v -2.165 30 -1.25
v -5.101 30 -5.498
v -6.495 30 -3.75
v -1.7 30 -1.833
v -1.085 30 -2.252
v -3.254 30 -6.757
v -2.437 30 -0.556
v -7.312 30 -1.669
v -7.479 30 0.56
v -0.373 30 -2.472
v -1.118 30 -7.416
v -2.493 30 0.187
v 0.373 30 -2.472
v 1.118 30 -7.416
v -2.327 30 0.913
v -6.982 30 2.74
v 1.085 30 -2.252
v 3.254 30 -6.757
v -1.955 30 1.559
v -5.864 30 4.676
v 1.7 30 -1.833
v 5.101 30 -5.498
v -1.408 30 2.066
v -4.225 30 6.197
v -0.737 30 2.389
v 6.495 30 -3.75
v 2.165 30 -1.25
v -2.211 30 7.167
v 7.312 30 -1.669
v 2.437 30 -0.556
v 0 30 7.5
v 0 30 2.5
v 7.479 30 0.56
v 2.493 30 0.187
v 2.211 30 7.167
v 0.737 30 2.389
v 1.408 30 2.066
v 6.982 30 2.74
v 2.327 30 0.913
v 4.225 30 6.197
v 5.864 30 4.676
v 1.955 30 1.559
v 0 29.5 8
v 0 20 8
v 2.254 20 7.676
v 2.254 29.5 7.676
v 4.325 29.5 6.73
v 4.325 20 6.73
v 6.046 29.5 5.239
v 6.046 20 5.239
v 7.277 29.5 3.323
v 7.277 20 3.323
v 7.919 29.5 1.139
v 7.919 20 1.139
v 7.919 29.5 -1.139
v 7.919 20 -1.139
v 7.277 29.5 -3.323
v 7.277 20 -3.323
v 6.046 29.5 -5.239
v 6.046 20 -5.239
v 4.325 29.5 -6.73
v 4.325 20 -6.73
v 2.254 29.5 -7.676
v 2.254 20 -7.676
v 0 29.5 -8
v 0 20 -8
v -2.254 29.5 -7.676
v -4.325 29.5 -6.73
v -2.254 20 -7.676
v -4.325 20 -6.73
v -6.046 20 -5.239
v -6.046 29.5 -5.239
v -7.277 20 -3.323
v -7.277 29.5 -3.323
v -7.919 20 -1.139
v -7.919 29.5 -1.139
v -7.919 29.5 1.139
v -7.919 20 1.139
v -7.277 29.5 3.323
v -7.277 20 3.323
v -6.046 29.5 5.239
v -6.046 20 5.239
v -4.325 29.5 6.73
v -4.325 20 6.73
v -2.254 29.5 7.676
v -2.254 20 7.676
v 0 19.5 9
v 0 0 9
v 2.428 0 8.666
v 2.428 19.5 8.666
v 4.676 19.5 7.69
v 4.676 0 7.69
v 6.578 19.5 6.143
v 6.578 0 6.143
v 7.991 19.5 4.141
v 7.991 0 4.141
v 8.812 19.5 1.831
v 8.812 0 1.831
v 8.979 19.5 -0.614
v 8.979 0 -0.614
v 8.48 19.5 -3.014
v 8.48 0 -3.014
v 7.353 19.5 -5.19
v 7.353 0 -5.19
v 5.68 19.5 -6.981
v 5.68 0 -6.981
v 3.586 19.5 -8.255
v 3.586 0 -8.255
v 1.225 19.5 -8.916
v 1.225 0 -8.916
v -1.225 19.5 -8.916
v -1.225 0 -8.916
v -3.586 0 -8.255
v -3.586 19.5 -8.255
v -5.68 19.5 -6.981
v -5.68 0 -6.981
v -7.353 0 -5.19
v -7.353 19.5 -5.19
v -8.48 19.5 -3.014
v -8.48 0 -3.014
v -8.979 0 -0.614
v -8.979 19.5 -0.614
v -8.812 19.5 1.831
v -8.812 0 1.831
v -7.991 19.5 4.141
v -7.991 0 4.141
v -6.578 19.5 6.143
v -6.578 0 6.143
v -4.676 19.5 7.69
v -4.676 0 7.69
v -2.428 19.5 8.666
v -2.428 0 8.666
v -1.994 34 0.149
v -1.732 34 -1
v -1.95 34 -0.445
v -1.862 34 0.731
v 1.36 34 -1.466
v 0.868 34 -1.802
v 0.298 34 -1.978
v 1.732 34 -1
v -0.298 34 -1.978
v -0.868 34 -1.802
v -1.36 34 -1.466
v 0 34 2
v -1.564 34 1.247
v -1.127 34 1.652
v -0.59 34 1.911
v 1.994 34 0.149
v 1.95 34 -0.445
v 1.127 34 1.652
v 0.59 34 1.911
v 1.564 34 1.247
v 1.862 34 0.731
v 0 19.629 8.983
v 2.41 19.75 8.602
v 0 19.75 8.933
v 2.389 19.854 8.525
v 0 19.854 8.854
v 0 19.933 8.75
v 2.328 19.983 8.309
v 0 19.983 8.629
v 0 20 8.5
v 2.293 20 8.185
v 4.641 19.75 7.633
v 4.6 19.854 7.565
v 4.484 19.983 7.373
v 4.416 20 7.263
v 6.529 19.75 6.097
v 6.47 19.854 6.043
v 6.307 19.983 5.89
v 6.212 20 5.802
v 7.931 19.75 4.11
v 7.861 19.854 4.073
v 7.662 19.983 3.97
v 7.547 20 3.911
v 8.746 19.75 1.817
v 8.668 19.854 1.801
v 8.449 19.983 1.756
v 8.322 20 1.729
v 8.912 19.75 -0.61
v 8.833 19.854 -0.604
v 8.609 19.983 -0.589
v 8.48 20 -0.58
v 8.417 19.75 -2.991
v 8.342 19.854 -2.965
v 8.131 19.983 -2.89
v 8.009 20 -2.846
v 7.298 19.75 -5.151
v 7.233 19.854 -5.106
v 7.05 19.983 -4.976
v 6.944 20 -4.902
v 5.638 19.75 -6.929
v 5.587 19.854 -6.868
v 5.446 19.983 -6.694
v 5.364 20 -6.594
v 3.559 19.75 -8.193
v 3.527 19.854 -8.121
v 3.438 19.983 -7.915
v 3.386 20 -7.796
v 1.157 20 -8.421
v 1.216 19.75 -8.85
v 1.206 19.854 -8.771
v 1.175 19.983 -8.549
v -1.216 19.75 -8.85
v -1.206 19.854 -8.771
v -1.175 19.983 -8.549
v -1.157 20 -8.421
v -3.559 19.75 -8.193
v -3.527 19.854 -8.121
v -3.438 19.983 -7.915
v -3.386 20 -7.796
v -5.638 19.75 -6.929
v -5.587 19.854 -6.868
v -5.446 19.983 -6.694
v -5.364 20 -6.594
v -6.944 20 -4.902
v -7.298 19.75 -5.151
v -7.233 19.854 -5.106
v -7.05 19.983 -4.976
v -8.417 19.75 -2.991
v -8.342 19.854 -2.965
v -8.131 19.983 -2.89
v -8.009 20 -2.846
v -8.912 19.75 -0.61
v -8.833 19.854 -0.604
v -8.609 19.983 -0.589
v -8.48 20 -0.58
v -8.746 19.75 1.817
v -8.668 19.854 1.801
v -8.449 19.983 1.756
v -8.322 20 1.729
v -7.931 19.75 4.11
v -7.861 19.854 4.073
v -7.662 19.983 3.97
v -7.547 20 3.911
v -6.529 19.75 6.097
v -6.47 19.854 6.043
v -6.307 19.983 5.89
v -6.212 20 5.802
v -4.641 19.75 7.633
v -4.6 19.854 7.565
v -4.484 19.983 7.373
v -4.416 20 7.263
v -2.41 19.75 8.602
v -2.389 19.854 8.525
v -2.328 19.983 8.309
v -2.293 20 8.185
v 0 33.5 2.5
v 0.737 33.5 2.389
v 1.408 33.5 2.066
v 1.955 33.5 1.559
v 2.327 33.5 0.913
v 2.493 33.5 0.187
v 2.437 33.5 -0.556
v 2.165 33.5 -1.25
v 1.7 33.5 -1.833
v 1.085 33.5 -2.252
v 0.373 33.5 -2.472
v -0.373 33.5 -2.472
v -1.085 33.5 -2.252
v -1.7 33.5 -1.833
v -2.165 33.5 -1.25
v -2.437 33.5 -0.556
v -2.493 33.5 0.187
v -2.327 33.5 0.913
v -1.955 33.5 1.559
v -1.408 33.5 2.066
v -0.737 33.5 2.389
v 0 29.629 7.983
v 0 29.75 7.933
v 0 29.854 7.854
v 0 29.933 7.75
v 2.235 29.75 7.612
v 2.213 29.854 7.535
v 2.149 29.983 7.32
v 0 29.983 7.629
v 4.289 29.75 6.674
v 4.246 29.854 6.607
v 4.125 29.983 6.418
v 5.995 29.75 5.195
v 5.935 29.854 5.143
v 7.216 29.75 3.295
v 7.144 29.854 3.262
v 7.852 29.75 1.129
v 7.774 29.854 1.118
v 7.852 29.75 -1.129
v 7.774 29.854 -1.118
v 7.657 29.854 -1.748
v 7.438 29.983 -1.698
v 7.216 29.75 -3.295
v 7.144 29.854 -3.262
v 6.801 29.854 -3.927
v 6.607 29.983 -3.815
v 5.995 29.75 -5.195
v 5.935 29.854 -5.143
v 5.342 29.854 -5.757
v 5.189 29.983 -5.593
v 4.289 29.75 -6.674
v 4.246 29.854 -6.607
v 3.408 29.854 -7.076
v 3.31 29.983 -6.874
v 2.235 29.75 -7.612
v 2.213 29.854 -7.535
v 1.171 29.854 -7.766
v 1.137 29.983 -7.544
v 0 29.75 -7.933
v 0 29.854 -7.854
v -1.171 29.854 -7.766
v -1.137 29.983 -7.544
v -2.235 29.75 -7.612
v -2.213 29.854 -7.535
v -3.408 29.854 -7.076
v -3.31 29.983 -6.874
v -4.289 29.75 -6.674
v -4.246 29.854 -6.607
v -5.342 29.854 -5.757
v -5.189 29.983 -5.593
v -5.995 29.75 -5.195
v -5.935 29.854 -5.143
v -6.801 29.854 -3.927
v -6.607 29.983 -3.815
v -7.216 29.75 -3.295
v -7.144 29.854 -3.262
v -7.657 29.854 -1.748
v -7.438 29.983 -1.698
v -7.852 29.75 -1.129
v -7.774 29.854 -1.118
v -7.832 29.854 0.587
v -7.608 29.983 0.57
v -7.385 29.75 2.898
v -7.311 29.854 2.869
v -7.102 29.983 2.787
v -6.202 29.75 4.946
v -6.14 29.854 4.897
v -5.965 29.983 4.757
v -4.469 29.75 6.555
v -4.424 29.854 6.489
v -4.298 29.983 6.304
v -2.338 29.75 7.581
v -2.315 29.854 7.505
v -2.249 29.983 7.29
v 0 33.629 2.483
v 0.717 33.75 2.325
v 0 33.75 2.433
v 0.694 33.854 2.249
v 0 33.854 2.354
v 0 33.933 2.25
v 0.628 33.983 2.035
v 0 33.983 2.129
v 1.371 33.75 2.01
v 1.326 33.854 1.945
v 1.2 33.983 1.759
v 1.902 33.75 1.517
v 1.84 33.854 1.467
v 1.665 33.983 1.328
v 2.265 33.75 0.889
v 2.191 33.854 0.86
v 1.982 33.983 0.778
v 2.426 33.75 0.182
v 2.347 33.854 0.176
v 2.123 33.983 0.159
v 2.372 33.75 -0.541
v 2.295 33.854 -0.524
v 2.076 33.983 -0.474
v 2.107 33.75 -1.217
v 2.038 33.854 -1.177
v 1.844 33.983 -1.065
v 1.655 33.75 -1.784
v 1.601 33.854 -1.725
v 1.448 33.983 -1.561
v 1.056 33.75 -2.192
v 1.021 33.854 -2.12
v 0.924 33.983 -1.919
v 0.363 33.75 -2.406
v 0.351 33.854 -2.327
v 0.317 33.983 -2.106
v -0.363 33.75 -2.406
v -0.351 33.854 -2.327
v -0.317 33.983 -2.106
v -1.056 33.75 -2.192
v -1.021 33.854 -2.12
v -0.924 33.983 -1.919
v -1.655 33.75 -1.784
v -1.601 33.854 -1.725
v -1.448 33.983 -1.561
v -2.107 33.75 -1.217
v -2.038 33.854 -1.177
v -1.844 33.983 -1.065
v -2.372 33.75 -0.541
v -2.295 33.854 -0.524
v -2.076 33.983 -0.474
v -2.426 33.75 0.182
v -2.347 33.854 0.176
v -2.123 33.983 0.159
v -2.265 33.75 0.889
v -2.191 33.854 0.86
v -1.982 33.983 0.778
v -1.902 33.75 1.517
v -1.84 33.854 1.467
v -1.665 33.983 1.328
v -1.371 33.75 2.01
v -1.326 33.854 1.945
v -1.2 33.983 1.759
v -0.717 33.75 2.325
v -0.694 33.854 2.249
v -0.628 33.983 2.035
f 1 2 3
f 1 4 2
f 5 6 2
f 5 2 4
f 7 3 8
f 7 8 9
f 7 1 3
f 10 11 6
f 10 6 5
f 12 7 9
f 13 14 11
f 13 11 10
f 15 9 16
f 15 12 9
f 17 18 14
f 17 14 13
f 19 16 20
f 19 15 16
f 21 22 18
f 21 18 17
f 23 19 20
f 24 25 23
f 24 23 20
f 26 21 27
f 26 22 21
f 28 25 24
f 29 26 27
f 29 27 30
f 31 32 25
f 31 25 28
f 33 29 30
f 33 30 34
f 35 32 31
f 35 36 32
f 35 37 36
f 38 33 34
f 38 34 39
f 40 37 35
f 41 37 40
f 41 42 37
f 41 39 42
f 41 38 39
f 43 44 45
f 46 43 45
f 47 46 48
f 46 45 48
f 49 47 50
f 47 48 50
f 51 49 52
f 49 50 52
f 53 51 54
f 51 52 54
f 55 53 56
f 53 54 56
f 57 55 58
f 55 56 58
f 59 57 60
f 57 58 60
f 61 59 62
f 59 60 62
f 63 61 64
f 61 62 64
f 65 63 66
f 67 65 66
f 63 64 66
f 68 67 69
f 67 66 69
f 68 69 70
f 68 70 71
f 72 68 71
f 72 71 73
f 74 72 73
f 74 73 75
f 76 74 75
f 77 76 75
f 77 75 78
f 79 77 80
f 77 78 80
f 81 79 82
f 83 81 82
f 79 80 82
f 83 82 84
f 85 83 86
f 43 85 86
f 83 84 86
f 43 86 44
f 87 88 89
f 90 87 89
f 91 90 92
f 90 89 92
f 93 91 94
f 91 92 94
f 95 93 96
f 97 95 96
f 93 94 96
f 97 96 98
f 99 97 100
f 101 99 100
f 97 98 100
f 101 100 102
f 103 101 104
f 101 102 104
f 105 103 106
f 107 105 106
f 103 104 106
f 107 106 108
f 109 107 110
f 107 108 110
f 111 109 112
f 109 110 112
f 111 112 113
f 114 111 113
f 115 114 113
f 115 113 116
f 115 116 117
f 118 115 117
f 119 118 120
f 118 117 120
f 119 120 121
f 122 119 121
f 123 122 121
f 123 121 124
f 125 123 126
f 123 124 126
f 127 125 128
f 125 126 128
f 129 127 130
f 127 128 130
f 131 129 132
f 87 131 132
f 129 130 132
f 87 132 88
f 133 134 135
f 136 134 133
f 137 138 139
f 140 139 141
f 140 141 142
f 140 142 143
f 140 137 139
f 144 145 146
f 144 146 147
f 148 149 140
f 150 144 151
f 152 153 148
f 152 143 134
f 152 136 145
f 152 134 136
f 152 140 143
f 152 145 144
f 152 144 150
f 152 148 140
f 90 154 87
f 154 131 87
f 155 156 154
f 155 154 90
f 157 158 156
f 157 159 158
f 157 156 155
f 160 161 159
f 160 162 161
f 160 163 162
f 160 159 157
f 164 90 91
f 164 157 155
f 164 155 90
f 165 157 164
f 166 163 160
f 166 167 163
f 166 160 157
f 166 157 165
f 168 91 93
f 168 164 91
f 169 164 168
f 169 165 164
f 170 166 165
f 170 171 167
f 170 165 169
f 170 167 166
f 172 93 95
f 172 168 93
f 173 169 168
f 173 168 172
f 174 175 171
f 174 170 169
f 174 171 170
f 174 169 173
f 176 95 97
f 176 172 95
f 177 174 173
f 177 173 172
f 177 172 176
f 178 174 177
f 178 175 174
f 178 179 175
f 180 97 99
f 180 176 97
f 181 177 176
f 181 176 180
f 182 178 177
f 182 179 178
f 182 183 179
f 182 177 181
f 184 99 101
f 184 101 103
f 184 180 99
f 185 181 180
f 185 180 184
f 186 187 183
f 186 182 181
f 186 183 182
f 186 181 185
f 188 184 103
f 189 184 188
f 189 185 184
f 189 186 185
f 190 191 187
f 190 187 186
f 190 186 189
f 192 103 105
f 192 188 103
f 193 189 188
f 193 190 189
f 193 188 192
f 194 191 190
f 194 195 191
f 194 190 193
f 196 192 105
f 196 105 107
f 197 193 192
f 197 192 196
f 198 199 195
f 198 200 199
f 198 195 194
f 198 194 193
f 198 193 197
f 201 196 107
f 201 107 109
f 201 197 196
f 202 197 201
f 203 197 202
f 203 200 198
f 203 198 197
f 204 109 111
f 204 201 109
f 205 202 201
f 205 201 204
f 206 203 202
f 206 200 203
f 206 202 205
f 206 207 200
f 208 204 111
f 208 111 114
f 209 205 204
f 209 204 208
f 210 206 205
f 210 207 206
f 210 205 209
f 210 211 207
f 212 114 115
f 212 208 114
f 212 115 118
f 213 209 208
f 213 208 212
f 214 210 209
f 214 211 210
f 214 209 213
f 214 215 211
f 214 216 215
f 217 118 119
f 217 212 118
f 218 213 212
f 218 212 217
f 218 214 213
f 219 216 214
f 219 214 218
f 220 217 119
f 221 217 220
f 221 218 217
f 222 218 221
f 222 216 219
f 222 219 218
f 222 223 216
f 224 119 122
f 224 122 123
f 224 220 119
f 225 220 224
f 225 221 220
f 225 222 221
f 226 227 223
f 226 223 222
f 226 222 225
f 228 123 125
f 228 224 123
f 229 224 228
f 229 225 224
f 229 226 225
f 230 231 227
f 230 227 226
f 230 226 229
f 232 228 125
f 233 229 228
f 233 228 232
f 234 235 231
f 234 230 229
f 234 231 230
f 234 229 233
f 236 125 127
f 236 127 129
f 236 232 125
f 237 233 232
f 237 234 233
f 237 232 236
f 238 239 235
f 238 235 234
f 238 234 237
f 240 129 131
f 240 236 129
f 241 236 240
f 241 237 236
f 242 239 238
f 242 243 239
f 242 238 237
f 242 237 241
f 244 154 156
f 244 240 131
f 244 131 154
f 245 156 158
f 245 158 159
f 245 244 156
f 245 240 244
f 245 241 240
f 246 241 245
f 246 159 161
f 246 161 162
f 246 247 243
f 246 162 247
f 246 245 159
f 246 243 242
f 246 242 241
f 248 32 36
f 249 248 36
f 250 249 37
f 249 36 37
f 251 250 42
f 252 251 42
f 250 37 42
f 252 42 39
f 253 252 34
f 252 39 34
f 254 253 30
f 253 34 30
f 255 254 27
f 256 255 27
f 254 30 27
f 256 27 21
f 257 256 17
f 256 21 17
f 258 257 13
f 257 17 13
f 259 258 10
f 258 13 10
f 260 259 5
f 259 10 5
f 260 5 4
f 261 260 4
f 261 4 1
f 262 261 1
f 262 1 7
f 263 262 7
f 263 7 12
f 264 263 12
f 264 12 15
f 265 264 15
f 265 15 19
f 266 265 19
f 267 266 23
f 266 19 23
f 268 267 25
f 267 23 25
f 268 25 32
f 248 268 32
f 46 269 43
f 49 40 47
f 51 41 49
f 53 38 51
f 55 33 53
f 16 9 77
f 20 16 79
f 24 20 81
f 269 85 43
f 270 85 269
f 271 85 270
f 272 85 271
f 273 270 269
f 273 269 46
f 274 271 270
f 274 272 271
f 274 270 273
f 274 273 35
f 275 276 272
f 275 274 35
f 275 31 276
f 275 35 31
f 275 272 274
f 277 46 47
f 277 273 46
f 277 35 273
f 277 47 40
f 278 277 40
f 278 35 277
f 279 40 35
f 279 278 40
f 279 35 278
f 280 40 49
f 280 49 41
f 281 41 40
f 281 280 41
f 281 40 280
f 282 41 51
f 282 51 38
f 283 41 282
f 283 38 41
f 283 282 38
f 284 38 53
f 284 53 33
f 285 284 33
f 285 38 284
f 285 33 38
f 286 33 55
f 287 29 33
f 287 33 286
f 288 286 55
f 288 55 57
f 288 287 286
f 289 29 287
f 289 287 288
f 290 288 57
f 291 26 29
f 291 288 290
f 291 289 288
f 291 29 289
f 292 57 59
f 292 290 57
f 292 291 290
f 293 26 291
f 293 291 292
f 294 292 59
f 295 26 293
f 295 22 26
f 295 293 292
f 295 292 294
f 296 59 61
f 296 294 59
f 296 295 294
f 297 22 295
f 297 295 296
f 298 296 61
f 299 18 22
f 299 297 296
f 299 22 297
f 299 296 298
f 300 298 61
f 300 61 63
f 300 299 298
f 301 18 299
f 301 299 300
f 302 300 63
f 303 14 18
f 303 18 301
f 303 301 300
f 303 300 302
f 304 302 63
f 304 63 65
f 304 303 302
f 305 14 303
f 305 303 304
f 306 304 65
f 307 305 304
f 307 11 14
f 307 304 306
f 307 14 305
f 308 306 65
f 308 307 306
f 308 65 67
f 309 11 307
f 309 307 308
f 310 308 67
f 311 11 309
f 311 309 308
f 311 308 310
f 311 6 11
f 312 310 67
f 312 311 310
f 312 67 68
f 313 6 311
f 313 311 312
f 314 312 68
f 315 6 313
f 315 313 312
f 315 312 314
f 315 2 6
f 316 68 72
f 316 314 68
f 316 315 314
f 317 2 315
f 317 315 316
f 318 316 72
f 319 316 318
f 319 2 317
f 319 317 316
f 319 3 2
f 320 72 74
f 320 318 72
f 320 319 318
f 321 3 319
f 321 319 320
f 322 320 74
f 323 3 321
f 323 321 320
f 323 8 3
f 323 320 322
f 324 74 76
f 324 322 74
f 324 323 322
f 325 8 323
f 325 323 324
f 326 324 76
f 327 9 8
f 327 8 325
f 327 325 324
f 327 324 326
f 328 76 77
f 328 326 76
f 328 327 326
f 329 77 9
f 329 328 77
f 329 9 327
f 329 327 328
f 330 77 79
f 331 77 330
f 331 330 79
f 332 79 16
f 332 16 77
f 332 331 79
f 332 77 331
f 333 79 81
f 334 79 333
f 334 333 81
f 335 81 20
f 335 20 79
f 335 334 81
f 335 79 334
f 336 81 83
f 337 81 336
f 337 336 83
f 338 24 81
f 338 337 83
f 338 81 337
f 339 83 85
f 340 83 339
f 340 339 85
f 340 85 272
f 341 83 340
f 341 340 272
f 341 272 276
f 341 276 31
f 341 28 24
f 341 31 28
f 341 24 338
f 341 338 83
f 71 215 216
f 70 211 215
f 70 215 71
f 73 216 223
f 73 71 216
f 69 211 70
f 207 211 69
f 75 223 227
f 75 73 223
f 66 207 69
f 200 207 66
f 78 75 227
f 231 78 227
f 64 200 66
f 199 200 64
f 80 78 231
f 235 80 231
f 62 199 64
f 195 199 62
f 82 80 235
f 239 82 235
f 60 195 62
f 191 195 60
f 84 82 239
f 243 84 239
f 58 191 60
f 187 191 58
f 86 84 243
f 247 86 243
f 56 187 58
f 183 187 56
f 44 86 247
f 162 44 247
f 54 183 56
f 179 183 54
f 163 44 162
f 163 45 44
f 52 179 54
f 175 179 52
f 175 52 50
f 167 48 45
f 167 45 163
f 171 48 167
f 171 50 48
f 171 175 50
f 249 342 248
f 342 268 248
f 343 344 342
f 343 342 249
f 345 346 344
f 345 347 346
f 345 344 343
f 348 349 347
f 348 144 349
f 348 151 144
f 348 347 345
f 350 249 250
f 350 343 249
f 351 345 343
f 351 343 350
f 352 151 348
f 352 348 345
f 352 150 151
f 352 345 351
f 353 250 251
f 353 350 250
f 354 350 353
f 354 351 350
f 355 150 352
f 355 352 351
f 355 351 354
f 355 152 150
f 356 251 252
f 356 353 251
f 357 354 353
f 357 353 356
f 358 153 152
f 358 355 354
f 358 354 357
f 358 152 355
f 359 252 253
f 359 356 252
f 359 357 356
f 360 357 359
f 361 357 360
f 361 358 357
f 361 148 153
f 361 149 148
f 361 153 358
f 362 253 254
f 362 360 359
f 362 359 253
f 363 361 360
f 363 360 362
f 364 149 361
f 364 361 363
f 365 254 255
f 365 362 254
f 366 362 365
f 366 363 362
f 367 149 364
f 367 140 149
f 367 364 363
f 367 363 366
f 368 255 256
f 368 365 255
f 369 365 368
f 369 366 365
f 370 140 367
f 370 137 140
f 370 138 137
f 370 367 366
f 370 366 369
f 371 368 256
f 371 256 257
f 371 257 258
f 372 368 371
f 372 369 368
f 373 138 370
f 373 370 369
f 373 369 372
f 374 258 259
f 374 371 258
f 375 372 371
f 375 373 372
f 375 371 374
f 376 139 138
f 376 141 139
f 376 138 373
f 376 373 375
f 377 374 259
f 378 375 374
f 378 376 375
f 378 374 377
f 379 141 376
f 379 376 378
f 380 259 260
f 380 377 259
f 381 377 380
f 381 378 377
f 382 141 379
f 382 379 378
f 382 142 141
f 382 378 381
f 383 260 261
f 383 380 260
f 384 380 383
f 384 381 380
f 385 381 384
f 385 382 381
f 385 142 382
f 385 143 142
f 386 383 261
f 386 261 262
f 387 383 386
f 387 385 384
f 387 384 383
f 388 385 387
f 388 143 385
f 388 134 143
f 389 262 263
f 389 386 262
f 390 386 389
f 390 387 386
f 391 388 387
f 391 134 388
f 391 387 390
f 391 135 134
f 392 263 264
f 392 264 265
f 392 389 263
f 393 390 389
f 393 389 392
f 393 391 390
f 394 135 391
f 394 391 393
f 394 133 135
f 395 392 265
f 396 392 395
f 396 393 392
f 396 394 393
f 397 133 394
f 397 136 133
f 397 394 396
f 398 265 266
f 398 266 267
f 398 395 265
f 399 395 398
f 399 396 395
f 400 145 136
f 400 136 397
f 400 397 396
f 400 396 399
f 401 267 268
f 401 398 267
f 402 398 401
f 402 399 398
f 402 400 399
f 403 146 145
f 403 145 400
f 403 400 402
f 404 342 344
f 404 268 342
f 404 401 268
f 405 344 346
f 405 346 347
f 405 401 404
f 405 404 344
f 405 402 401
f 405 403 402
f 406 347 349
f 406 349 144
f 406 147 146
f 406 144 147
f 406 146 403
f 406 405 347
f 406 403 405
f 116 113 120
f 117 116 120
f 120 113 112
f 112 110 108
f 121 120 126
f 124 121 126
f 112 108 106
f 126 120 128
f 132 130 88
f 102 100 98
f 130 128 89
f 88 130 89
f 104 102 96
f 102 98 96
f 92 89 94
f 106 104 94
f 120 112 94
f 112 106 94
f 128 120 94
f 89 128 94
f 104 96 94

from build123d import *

# Parameters (mm, degrees)
SKETCH1_R           = 9
BOSS_EXTRUDE1_DEPTH = 20
SKETCH2_R           = 8
BOSS_EXTRUDE2_DEPTH = 10
SKETCH3_R           = 2.5
BOSS_EXTRUDE3_DEPTH = 4
FILLET1_R           = 0.5


with BuildPart() as part:
    # Sketch1 → Boss-Extrude1 (new body)
    with BuildSketch(Plane(origin=(0, 0, 0), x_dir=(1, 0, 0), z_dir=(0, 1, 0))):
        with Locations(Location((0, 0, 0), (0, 0, 270))):
            Circle(SKETCH1_R)
    extrude(amount=BOSS_EXTRUDE1_DEPTH)

    # Sketch2 → Boss-Extrude2 (add)
    with BuildSketch(Plane(origin=(0, 20, 0), x_dir=(1, 0, 0), z_dir=(0, 1, 0))):
        with Locations(Location((0, 0, 0), (0, 0, 270))):
            Circle(SKETCH2_R)
    extrude(amount=BOSS_EXTRUDE2_DEPTH)

    # Sketch3 → Boss-Extrude3 (add)
    with BuildSketch(Plane(origin=(0, 30, 0), x_dir=(1, 0, 0), z_dir=(0, 1, 0))):
        with Locations(Location((0, 0, 0), (0, 0, 270))):
            Circle(SKETCH3_R)
    extrude(amount=BOSS_EXTRUDE3_DEPTH)

    # Fillet1
    fillet1_edges = [part.edges().sort_by_distance(p)[0] for p in [
        (0, 34, -2.5),
        (0, 20, -9),
        (0, 30, -8),
    ]]
    fillet(fillet1_edges, radius=FILLET1_R)


solid = part.part
